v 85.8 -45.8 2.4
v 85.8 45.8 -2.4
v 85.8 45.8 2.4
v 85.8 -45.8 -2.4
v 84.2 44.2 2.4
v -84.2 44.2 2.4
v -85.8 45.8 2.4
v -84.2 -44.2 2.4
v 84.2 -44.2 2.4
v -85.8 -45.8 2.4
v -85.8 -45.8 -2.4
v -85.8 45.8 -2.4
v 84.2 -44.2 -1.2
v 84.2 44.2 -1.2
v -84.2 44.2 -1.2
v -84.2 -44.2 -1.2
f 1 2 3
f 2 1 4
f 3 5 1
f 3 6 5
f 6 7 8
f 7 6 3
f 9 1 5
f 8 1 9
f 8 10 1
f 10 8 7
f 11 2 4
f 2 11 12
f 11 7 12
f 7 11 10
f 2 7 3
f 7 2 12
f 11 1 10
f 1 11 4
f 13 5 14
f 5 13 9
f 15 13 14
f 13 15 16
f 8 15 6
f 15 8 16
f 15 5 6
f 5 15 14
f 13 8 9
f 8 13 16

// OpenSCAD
// file: ../base_shell.scad
// ===============================================================
// Two-cube base shell — parameterized, concise version
// ===============================================================

// ---- Module Definition ----
module base_shell(
  plate_size, // width/height of one cube (required)
  cube_count, // number of cubes along X
  connector_thickness, // outer face/connector plate thickness
  panel_thickness, // inner ledge/seating thickness
  wall_thickness, // true wall thickness
  fit_allowance // clearance for fit
) {
  extra_width = connector_thickness + panel_thickness;

  // Derived dimensions
  outer = [
    cube_count * plate_size + 2 * (wall_thickness + extra_width),
    plate_size + 2 * (wall_thickness + extra_width),
    wall_thickness * 2,
  ];

  inner = [
    cube_count * plate_size + 2 * (fit_allowance + extra_width),
    plate_size + 2 * (fit_allowance + extra_width),
    outer[2],
  ];

  difference() {
    cube(outer, center=true);
    translate([0, 0, wall_thickness / 2])
      color("lightgrey") cube(inner, center=true);
  }
}
// main file
use <../base_shell.scad>;

// ---- Example Usage ----
plate_dim_example = 80;
cube_count_example = 2;
fit_example = 0.8;
wall_example = 2.4;
panel_th_example = 1.4;
connector_th_example = 2.0;

base_shell(
  plate_size=plate_dim_example,
  cube_count=cube_count_example,
  connector_thickness=connector_th_example,
  panel_thickness=panel_th_example,
  wall_thickness=wall_example,
  fit_allowance=fit_example
);
